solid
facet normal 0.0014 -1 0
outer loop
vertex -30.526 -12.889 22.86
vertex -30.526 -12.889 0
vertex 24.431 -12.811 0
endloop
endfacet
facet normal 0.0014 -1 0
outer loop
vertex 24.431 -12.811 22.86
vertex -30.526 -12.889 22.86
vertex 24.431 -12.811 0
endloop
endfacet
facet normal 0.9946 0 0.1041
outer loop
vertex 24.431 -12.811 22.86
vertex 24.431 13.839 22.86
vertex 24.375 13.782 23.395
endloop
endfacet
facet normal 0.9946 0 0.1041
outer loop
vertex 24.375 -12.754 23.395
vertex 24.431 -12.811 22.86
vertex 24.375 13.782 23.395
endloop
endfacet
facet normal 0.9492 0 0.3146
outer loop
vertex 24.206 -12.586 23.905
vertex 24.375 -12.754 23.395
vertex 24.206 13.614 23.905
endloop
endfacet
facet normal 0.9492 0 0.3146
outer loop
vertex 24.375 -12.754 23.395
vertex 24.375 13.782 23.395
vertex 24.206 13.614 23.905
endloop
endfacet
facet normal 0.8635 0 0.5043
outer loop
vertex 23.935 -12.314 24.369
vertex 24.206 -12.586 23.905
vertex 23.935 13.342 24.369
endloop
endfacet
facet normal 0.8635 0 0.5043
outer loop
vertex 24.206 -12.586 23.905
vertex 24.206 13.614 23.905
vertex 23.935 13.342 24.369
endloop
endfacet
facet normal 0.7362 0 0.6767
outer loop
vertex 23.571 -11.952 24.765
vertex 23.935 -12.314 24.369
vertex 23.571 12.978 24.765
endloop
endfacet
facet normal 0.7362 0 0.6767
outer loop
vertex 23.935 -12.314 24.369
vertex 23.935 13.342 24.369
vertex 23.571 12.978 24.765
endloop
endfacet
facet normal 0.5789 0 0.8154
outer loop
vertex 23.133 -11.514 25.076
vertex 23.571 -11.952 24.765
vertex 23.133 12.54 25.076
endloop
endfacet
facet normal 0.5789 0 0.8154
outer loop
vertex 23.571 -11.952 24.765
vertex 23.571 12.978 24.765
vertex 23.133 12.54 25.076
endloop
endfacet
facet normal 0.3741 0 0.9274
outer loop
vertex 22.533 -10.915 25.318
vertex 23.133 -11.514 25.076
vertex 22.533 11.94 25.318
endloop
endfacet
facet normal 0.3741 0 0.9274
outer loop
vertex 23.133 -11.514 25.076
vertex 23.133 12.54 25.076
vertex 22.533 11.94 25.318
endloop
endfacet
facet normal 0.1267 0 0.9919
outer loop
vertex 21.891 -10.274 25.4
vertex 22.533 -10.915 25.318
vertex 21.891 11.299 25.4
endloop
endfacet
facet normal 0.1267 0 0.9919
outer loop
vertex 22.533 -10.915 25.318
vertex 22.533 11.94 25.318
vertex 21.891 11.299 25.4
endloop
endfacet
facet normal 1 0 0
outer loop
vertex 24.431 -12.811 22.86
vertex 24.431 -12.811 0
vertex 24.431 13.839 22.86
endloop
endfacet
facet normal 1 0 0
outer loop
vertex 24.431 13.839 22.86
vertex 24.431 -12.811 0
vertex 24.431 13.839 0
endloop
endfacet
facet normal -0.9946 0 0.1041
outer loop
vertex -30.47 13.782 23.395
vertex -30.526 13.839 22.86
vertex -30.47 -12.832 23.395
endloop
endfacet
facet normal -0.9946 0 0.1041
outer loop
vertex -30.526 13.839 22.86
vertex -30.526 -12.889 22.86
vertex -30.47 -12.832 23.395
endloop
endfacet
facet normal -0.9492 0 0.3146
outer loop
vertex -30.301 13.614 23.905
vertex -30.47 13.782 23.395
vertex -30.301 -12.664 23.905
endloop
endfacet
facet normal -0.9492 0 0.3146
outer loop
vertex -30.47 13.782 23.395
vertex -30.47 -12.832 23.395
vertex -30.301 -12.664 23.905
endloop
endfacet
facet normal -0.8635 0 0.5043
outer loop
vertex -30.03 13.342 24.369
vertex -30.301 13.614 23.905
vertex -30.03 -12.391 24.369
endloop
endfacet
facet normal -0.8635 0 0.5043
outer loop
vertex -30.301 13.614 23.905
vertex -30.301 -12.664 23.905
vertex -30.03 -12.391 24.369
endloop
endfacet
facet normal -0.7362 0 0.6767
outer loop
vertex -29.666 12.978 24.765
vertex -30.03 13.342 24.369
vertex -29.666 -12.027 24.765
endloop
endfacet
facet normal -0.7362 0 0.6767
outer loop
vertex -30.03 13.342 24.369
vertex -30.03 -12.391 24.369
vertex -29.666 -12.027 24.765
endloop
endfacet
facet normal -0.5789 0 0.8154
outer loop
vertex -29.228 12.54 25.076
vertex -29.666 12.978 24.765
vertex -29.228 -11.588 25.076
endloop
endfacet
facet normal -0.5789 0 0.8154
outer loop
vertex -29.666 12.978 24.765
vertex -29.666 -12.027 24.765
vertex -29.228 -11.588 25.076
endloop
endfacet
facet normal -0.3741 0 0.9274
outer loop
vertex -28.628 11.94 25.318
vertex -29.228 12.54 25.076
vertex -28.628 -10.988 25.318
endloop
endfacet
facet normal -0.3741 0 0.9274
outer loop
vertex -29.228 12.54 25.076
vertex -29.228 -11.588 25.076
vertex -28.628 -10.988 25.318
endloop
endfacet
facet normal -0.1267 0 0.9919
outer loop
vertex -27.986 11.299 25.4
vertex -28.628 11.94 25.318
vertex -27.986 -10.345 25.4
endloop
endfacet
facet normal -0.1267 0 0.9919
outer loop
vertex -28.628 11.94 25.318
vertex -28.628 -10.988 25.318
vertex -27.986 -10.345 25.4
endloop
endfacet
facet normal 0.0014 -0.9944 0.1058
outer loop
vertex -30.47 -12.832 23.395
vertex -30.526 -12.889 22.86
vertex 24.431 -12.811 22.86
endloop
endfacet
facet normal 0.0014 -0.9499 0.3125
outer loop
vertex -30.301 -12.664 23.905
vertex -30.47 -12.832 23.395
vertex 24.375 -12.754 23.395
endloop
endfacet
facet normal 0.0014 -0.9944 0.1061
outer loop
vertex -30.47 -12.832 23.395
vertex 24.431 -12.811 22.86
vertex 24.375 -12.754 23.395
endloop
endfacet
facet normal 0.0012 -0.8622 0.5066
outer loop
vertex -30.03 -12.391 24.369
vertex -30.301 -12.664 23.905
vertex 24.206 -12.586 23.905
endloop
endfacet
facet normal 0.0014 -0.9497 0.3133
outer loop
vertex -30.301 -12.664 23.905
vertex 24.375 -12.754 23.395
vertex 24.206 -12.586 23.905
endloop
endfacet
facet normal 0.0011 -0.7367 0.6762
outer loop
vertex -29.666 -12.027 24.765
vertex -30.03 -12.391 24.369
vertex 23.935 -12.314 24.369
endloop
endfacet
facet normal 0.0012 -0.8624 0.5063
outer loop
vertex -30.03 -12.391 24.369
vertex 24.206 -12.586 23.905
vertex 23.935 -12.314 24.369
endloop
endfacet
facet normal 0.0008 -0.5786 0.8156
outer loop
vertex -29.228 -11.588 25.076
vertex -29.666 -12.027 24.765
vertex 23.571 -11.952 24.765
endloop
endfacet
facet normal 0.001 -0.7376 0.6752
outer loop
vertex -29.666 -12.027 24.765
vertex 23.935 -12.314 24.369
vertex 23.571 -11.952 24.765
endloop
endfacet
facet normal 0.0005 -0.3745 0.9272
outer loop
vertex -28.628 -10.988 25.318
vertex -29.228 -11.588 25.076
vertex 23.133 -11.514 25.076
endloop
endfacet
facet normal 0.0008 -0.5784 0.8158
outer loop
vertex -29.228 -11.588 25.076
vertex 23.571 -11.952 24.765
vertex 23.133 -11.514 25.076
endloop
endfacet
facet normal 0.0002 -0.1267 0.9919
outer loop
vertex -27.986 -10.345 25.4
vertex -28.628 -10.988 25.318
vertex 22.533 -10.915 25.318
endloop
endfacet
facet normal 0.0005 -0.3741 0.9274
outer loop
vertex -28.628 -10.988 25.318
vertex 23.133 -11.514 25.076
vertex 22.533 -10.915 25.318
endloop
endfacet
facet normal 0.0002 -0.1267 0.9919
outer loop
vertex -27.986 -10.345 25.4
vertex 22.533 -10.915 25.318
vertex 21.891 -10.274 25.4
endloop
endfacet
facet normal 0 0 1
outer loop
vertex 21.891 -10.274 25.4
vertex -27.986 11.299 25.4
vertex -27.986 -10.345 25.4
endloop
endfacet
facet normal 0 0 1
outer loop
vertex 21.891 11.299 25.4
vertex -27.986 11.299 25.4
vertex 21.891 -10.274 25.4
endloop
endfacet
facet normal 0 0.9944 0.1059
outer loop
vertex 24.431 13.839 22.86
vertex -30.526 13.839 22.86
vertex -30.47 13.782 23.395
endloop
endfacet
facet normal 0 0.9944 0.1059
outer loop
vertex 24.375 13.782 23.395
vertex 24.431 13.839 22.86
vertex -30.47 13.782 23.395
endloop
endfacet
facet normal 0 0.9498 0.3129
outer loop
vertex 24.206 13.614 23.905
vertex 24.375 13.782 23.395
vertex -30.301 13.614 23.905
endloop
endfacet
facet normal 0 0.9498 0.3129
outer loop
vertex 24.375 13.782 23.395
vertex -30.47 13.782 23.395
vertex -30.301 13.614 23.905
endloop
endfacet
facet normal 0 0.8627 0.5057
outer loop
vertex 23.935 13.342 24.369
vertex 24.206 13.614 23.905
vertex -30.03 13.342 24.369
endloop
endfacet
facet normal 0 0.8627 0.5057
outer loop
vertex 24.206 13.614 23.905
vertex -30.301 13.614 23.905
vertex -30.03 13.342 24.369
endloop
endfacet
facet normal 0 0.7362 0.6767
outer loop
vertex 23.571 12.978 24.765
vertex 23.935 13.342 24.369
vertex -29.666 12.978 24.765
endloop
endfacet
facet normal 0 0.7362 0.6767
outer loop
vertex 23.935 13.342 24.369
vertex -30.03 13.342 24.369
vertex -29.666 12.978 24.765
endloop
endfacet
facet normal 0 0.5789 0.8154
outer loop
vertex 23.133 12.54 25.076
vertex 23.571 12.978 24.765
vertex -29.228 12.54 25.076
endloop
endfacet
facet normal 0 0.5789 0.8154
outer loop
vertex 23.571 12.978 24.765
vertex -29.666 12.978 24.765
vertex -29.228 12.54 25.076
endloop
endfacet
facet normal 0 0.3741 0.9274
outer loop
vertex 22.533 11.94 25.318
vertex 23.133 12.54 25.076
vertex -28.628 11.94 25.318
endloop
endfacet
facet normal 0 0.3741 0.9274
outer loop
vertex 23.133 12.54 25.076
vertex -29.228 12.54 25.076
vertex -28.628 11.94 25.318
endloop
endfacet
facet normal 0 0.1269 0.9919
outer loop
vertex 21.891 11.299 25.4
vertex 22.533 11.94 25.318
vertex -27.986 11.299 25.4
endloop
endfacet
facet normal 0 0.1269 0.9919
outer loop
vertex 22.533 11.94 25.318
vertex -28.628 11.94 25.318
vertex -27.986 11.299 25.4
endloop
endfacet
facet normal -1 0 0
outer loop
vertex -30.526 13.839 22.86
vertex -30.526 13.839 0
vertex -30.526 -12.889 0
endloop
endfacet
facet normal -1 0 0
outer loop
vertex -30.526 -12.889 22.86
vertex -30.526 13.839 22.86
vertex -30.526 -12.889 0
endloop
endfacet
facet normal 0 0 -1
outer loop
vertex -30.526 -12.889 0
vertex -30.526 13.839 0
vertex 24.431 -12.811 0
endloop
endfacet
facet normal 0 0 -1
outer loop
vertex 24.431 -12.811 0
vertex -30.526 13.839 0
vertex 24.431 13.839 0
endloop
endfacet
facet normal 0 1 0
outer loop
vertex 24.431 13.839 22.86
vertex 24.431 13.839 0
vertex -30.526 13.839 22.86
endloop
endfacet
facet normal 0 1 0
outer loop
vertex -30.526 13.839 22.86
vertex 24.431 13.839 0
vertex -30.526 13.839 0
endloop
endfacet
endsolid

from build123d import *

# Parameters (mm, degrees)
F1_DEPTH = 25.4
F2_R     = 2.54


with BuildPart() as f1:
    # F0 (on Top) → F1 (new body)
    with BuildSketch(Plane.XY):
        Polygon((24.431467, 13.838641), (-30.526407, 13.838641), (-30.526407, 0), (-30.526407, -12.888923), (24.431467, -12.810618), align=None)
    extrude(amount=F1_DEPTH)

    # F2
    f2_edges = [f1.edges().sort_by_distance(p)[0] for p in [
        (-3.04747, -12.84977, 25.4),
        (-3.04747, 13.838641, 25.4),
        (24.431467, 0.514012, 25.4),
        (-30.526407, 0.474859, 25.4),
    ]]
    fillet(f2_edges, radius=F2_R)


solid = f1.part
